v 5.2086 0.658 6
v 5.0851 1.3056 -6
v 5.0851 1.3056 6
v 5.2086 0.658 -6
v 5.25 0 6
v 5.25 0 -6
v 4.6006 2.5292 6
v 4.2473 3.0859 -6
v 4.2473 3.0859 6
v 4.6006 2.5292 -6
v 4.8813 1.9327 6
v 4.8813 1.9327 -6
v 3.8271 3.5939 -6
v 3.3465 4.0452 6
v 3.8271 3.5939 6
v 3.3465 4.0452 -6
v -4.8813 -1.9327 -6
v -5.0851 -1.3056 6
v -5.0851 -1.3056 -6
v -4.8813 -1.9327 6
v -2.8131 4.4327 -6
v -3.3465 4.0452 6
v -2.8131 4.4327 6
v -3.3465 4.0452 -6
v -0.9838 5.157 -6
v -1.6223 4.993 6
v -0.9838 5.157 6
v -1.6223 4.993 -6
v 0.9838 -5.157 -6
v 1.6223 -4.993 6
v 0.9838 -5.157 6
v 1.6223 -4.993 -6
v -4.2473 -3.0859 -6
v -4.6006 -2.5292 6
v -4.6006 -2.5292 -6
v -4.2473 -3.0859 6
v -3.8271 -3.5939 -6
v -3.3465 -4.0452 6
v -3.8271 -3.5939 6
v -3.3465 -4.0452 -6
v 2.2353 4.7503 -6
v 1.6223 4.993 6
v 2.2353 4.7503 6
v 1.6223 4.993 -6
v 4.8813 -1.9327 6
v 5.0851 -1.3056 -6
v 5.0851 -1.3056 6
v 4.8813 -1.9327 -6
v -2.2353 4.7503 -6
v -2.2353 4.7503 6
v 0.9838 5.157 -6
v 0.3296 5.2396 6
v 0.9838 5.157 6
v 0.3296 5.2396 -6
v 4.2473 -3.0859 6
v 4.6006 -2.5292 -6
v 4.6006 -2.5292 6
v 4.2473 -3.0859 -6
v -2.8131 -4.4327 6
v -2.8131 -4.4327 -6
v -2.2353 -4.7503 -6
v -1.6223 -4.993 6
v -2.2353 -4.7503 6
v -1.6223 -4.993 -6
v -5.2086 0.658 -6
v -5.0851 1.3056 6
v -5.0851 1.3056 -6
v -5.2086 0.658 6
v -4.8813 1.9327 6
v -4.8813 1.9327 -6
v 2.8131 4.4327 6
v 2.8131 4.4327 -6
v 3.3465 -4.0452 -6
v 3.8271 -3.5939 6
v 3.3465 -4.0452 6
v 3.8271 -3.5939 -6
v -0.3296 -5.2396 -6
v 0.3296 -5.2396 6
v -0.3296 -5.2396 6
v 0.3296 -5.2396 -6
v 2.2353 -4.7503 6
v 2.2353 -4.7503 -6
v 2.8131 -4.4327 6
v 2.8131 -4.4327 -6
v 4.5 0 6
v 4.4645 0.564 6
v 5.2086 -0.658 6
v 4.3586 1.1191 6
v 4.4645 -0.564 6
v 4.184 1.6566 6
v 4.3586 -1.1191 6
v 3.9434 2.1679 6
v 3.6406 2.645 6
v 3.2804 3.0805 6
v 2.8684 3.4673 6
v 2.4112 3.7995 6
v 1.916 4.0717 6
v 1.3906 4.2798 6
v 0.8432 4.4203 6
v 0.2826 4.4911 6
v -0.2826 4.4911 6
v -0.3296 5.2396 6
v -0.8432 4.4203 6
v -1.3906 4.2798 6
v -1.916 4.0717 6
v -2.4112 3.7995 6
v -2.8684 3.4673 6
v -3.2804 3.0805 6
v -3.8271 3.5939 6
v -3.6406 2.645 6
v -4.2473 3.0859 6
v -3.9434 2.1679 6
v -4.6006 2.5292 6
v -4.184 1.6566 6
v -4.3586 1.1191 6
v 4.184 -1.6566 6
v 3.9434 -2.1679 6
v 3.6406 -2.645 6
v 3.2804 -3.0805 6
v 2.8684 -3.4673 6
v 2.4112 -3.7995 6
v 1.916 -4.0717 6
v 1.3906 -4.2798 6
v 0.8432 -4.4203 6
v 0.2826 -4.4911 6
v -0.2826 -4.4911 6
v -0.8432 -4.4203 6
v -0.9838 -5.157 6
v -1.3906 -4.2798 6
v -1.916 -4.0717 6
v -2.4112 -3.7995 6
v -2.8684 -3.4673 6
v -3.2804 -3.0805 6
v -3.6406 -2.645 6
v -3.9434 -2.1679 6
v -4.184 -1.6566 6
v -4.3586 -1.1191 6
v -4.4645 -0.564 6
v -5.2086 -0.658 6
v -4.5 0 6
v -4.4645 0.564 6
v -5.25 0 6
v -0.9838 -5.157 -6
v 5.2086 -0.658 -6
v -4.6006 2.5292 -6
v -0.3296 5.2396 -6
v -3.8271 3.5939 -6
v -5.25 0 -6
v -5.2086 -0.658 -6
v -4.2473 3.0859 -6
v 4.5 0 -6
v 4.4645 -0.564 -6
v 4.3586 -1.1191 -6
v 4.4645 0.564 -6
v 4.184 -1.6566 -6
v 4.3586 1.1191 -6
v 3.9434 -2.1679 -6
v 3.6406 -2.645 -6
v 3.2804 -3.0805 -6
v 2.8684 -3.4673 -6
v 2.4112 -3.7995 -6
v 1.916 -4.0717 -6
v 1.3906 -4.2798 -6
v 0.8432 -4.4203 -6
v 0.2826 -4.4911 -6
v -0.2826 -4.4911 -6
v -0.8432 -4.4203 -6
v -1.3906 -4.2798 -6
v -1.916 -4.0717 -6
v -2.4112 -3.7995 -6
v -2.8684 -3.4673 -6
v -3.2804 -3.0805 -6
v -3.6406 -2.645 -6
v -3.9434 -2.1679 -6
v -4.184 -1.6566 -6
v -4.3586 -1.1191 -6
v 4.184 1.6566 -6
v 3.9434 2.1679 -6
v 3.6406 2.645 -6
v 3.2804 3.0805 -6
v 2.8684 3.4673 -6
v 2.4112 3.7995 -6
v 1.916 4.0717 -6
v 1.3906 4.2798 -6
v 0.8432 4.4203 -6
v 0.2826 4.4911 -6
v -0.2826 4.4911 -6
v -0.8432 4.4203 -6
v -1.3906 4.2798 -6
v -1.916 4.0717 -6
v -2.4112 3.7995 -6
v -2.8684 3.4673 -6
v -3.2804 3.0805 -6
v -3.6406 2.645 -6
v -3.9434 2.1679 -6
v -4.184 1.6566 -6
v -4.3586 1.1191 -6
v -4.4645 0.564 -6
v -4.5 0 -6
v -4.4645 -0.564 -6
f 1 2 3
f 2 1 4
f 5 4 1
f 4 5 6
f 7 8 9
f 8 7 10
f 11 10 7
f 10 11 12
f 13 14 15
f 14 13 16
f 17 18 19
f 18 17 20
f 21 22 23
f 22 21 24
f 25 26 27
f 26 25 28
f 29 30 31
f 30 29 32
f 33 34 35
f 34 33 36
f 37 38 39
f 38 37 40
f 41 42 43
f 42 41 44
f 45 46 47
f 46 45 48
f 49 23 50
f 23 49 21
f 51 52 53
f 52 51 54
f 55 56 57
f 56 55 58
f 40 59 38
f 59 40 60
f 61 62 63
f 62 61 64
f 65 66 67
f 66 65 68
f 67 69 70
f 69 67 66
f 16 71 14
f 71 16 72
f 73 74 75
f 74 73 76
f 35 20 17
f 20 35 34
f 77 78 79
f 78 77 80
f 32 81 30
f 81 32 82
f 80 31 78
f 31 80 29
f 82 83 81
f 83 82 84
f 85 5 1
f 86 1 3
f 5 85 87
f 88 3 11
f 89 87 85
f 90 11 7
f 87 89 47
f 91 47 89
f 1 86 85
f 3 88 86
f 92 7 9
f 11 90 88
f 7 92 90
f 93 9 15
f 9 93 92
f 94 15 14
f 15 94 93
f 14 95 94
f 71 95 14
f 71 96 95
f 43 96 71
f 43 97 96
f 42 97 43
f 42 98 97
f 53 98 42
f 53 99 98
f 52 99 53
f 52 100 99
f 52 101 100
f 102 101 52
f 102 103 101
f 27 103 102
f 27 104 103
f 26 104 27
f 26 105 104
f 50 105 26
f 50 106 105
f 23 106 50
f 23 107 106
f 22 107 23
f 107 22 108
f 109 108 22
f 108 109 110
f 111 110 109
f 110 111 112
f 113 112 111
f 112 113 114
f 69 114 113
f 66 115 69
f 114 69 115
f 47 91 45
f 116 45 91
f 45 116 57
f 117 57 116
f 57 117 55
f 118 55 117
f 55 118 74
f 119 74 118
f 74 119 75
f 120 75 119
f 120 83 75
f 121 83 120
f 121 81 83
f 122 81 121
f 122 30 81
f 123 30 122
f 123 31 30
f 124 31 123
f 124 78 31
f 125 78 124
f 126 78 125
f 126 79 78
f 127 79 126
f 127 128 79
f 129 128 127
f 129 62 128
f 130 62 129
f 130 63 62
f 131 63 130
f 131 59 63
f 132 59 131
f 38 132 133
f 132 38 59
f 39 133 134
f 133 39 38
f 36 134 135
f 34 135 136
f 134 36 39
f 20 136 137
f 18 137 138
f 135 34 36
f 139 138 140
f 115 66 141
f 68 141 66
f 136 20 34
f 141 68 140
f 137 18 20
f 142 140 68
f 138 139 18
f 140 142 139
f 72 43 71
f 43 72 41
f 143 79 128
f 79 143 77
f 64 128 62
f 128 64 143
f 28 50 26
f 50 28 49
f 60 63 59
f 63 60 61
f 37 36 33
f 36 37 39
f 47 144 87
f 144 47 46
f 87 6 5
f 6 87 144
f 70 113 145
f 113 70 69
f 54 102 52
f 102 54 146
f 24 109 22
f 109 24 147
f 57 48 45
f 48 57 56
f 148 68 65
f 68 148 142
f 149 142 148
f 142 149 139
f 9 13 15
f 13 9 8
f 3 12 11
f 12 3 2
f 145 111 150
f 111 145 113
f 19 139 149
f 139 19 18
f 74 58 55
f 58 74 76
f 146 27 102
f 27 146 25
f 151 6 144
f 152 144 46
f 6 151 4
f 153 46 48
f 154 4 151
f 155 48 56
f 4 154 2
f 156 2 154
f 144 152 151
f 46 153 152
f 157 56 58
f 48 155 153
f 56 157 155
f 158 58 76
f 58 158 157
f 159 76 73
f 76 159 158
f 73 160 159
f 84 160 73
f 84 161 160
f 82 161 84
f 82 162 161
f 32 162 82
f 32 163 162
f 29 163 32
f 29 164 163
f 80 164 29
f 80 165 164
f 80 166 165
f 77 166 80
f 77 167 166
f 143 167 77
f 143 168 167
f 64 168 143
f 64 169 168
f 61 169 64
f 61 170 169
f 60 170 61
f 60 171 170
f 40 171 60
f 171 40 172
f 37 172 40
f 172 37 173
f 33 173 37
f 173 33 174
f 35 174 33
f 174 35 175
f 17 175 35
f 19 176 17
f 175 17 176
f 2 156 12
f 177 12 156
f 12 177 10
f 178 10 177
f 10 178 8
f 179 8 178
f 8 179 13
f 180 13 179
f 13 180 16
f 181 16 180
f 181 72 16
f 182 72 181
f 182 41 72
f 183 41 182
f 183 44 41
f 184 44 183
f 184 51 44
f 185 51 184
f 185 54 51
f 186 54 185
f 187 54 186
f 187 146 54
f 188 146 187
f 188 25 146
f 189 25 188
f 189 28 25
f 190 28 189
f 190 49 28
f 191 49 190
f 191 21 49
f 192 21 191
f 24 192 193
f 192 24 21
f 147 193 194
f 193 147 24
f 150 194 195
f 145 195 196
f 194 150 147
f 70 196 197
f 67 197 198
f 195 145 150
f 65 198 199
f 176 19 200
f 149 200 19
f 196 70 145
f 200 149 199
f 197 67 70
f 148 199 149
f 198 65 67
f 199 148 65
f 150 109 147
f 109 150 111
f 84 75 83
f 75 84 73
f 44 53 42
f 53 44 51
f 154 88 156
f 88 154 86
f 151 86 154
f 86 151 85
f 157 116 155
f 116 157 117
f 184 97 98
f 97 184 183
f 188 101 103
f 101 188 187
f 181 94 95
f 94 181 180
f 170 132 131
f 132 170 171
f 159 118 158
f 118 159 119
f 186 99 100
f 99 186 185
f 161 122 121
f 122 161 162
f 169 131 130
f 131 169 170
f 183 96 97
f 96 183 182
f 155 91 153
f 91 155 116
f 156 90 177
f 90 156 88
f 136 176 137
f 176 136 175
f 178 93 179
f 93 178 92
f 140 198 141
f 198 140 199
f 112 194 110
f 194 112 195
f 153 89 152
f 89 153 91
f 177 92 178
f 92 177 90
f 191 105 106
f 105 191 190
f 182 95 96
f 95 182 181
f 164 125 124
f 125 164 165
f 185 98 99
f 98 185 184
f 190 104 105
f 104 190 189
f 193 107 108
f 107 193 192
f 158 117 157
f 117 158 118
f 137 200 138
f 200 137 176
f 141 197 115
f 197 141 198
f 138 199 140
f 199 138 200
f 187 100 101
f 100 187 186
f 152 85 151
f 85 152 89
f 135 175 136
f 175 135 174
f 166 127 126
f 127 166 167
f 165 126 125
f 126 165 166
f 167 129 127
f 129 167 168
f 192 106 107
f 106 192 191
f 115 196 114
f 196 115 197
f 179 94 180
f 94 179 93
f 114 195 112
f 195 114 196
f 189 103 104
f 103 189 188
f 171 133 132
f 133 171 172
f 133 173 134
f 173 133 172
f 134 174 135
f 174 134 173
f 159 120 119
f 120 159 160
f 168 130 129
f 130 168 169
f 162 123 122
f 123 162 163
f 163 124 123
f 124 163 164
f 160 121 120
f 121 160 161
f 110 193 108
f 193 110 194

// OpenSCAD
$fn = 50;


difference() {
	union() {
		translate(v = [0, 0, -6.0000000000]) {
			cylinder(h = 12, r = 5.2500000000);
		}
	}
	union() {
		translate(v = [0, 0, -100.0000000000]) {
			cylinder(h = 200, r = 4.5000000000);
		}
	}
}
